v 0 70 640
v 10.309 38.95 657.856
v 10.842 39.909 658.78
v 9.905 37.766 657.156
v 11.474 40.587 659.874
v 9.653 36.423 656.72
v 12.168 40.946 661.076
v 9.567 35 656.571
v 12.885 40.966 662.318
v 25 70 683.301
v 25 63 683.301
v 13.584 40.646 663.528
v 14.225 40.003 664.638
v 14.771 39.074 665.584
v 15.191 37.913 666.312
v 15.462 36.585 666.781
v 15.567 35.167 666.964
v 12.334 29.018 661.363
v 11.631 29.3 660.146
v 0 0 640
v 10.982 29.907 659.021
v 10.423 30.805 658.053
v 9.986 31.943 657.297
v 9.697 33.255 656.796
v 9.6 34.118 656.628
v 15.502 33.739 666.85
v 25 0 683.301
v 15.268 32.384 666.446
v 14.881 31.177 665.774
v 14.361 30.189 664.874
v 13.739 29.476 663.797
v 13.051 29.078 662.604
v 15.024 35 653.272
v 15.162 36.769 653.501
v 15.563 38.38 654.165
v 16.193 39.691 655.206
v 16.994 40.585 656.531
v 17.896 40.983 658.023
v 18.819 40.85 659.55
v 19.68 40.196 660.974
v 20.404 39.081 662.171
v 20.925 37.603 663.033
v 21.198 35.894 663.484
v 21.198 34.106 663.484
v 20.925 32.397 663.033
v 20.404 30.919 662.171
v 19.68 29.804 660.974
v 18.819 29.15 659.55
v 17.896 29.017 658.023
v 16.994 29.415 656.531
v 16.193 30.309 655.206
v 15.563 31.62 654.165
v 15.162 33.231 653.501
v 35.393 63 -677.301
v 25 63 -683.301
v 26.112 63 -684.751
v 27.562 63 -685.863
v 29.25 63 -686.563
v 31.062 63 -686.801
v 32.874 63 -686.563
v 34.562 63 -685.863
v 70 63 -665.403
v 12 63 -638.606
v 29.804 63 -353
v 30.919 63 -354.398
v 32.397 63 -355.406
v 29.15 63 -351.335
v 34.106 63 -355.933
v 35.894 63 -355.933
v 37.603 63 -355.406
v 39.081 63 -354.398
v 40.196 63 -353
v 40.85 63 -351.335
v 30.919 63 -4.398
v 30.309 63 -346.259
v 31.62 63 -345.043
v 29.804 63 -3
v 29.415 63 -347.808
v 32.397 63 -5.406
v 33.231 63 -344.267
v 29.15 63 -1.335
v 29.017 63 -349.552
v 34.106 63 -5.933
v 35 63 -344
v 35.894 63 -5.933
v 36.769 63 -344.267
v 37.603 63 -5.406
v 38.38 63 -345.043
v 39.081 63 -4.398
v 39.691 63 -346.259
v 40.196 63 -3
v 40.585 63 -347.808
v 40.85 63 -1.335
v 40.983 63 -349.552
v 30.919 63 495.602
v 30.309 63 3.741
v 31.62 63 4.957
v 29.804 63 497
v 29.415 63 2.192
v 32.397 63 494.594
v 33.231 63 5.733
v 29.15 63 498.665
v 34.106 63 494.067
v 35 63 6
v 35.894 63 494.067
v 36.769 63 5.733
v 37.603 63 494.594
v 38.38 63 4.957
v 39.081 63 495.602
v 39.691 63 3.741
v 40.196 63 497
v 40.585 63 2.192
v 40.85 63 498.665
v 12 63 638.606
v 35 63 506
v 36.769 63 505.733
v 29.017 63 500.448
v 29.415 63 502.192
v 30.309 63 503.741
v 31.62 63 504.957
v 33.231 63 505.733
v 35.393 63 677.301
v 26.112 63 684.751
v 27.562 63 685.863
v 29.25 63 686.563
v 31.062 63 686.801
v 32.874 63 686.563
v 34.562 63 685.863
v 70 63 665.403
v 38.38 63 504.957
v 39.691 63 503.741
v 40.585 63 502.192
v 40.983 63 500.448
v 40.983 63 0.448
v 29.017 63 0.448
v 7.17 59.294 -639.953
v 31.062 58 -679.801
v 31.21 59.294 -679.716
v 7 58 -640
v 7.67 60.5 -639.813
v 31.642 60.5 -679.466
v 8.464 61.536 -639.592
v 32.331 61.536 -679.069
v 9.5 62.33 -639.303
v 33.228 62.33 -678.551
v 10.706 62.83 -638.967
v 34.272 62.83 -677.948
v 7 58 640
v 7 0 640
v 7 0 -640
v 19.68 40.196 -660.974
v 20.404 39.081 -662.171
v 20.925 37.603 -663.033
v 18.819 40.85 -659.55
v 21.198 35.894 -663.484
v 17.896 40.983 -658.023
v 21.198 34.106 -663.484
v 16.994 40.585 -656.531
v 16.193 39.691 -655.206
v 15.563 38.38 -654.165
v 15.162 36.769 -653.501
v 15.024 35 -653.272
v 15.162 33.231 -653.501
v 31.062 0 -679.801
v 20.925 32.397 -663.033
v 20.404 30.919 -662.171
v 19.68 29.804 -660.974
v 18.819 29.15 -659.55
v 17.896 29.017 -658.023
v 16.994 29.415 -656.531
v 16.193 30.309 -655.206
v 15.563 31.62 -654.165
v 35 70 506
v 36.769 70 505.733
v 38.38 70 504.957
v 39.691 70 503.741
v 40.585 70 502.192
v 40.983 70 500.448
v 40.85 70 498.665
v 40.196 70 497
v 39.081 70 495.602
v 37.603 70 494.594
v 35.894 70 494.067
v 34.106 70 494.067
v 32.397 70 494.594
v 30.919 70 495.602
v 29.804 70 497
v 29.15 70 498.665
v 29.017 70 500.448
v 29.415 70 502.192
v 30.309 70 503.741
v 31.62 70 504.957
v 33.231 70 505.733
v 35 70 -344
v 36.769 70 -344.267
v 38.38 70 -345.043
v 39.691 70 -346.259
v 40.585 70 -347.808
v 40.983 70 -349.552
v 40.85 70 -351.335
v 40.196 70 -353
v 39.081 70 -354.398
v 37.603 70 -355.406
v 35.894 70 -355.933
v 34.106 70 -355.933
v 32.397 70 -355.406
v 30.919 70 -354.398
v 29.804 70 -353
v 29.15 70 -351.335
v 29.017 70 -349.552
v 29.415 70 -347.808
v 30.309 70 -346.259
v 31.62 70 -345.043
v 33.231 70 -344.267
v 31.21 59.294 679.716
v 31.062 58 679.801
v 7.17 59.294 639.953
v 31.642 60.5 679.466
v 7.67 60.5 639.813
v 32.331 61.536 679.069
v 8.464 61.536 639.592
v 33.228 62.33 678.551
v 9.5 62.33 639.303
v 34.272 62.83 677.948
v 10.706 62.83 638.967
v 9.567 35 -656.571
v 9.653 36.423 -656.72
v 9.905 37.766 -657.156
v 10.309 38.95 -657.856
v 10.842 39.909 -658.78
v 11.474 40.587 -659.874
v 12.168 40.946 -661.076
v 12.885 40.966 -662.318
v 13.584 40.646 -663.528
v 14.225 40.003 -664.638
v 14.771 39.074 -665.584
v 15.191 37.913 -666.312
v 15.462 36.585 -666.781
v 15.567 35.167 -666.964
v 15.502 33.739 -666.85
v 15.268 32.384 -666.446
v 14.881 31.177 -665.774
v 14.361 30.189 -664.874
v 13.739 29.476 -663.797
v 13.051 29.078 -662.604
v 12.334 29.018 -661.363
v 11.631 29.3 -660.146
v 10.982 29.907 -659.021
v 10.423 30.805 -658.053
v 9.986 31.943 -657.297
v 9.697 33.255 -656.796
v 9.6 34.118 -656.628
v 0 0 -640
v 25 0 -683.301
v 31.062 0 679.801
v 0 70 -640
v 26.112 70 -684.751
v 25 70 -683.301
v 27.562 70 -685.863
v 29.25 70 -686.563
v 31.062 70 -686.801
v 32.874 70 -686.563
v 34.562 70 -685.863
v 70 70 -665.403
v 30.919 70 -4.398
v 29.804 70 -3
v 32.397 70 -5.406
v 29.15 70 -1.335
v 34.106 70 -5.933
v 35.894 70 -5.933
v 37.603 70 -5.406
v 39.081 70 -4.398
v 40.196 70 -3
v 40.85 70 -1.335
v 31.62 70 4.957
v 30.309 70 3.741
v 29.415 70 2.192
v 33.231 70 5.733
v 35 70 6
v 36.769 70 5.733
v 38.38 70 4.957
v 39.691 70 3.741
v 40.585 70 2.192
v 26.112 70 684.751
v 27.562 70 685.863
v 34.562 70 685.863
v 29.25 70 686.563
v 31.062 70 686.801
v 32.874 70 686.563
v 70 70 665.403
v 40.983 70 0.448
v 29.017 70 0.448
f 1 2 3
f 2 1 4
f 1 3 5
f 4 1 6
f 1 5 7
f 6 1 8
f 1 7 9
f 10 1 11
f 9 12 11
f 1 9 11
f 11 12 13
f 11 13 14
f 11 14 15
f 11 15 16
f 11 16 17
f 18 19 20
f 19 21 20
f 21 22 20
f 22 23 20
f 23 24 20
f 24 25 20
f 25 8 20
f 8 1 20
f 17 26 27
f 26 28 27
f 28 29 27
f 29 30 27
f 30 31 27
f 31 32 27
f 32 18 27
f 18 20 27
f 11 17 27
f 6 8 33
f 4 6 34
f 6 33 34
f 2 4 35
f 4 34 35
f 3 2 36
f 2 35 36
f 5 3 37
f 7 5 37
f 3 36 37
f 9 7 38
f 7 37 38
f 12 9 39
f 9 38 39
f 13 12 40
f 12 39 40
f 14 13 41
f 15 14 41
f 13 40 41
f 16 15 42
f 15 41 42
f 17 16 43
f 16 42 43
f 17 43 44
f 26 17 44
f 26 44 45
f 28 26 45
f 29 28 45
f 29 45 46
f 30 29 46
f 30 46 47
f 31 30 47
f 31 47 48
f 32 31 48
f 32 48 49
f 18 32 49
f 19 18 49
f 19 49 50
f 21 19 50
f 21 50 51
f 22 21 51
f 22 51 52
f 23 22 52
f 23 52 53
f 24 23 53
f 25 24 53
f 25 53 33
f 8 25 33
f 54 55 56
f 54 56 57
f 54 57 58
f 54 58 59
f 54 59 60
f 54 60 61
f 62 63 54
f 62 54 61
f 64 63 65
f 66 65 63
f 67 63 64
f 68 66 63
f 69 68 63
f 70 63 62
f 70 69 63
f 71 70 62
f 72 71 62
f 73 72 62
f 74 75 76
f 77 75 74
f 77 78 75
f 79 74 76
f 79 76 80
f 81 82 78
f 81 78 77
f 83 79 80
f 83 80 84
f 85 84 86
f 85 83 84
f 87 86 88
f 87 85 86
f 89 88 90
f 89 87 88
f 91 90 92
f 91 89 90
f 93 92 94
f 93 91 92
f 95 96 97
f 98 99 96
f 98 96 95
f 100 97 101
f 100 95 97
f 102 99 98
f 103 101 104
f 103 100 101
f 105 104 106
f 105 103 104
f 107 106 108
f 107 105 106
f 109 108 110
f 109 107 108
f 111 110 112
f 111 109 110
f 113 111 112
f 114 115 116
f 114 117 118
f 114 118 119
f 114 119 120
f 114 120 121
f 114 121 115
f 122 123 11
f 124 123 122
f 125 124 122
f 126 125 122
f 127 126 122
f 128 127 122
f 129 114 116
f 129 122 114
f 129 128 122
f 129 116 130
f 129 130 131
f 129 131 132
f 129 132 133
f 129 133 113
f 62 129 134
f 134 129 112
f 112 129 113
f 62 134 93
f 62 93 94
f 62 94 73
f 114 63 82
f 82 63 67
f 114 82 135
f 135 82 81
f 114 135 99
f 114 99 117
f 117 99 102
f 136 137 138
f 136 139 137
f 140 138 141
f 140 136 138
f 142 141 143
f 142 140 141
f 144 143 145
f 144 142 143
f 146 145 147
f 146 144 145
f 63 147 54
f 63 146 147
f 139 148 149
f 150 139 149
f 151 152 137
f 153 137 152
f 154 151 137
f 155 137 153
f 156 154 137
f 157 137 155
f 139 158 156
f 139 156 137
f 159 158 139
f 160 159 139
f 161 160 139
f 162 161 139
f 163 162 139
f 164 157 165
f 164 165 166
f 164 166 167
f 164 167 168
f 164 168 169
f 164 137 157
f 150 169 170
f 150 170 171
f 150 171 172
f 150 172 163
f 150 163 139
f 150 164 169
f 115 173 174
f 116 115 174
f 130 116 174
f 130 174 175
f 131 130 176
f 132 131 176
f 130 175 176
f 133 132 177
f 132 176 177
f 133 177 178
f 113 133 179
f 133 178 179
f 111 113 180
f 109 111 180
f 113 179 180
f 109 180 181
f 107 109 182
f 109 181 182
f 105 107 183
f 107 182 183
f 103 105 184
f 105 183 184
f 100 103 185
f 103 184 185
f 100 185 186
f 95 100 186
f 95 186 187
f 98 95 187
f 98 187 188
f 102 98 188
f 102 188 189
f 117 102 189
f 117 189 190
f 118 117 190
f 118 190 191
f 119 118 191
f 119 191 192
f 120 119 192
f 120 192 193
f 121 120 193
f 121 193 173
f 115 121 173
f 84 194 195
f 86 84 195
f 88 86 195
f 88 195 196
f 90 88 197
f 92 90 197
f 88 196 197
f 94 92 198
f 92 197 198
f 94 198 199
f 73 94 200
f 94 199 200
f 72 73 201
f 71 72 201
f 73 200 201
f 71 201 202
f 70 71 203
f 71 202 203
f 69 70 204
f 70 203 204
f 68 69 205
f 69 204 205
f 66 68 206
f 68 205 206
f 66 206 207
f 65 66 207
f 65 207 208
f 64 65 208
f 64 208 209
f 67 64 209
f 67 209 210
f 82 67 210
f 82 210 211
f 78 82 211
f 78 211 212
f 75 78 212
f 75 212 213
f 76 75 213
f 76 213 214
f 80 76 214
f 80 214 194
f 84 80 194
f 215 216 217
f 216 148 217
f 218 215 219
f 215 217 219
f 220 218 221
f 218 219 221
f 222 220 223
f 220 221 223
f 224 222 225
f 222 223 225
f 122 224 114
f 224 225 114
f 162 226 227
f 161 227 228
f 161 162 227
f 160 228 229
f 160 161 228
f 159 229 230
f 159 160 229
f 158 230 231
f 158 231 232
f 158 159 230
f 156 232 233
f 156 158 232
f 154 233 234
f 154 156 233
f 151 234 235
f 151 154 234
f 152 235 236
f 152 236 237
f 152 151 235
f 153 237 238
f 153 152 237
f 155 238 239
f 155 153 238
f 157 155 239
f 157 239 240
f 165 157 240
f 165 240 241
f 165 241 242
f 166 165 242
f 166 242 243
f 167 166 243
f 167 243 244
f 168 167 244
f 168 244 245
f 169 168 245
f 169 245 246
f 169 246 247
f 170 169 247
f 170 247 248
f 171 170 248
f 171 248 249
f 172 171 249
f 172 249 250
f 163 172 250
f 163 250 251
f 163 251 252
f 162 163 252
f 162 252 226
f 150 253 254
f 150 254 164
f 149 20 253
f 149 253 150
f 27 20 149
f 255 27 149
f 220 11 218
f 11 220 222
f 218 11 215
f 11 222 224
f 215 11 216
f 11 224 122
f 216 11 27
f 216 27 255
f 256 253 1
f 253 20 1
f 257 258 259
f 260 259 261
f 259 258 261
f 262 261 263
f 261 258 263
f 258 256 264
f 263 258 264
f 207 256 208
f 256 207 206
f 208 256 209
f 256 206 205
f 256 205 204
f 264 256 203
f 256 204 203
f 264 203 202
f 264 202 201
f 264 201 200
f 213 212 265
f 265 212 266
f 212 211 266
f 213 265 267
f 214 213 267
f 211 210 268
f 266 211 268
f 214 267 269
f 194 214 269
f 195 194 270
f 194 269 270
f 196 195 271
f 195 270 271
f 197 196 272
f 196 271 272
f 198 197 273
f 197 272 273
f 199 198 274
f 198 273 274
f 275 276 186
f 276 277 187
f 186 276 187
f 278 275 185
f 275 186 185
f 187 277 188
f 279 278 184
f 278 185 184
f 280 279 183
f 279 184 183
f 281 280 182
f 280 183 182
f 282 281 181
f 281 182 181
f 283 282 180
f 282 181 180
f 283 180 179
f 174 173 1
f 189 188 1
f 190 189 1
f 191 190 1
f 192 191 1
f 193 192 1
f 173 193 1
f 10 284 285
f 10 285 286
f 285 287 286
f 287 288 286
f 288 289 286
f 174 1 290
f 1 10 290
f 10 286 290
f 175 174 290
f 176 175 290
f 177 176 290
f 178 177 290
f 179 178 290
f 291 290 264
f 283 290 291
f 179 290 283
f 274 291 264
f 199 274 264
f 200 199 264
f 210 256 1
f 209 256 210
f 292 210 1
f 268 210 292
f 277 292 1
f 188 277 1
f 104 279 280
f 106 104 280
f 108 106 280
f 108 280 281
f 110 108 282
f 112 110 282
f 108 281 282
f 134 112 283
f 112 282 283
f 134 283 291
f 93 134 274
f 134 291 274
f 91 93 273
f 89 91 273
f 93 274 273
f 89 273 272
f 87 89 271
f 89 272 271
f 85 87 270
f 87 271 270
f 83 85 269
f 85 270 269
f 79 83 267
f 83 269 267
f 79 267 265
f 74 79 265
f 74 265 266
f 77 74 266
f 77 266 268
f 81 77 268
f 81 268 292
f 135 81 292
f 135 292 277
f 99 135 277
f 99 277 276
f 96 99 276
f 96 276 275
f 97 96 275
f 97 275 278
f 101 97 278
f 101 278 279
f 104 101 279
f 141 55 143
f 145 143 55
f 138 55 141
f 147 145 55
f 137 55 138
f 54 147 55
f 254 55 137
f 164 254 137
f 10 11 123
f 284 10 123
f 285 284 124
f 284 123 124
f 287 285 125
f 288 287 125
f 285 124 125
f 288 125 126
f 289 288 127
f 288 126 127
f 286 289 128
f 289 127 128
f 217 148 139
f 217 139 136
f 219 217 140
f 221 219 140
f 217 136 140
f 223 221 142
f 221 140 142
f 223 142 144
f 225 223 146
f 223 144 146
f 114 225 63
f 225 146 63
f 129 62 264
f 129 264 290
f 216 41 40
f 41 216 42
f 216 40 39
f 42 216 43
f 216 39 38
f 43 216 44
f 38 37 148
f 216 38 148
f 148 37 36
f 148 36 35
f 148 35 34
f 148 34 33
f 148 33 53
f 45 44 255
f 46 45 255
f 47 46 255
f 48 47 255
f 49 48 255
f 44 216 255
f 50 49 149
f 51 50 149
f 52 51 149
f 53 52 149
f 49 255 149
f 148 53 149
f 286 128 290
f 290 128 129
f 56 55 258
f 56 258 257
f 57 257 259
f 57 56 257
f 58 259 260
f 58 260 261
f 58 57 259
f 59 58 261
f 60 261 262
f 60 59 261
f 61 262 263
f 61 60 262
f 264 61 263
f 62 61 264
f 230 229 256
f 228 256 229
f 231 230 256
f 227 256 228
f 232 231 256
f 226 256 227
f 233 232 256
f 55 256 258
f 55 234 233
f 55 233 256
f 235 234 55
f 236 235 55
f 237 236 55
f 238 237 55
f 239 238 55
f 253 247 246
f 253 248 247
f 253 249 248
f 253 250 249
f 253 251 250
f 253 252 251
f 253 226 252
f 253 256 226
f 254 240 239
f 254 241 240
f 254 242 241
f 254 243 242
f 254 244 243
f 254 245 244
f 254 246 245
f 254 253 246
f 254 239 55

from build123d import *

# Parameters (mm, degrees)
BOSS_EXTRUDE1_DEPTH = 640
BOSS_EXTRUDE2_DEPTH = 63
BOSS_EXTRUDE4_DEPTH = 7
SKETCH10_R          = 6
CUT_EXTRUDE3_DEPTH  = 7
FILLET5_R           = 5
SKETCH22_R          = 6
CUT_EXTRUDE4_DEPTH  = 335


with BuildPart() as part:
    # Sketch1 → Boss-Extrude1 (new body)
    with BuildSketch(Plane.XY):
        Polygon((0, 0), (0, 70), (70, 70), (70, 63), (7, 63), (7, 0), align=None)
    extrude(amount=BOSS_EXTRUDE1_DEPTH)

    # Sketch2 → Boss-Extrude2 (add)
    with BuildSketch(Plane(origin=(0, 0, 0), x_dir=(1, 0, 0), z_dir=(0, 1, 0))):
        Polygon((0, -640), (25, -683.301270189), (31.062177826, -679.801270189), (7, -640), align=None)
    extrude(amount=BOSS_EXTRUDE2_DEPTH)

    # Sketch9 → Boss-Extrude4 (add)
    with BuildSketch(Plane(origin=(0, 63, 0), x_dir=(1, 0, 0), z_dir=(0, 1, 0))):
        with BuildLine():
            Line((0, -640), (25, -683.301270189))
            ThreePointArc((25, -683.301270189), (29.250444511, -686.562750973), (34.562177826, -685.863448016))
            Line((34.562177826, -685.863448016), (70, -665.403411844))
            Line((70, -665.403411844), (70, -640))
            Line((70, -640), (0, -640))
        make_face()
    extrude(amount=BOSS_EXTRUDE4_DEPTH)

    # Sketch10 → Cut-Extrude3 (cut)
    with BuildSketch(Plane(origin=(-278.227615862, 0, 168.20474164), x_dir=(-0.5173609804017633, 0, -0.8557672674026079), z_dir=(0.8557672674026079, 0, -0.5173609804017633))):
        with Locations((-572.82203414, 35)):
            Circle(SKETCH10_R)
    extrude(amount=-CUT_EXTRUDE3_DEPTH, mode=Mode.SUBTRACT)

    # Fillet5
    fillet5_edges = [part.edges().sort_by_distance(p)[0] for p in [
        (7, 63, 320),
        (19.031088913, 63, 659.900635095),
    ]]
    fillet(fillet5_edges, radius=FILLET5_R)

    # Mirror6: part across plane


with BuildPart() as part_1:
    add(part.part)
    add(part.part.mirror(Plane.XY))

    # Sketch22 → Cut-Extrude4 (cut)
    with BuildSketch(Plane(origin=(0, 70, 0), x_dir=(1, 0, 0), z_dir=(0, 1, 0))):
        with Locations(Location((35, 0, 0), (0, 0, 270))):
            Circle(SKETCH22_R)
        with Locations(Location((35, 350, 0), (0, 0, 270))):
            Circle(SKETCH22_R)
        with Locations(Location((35, -500, 0), (0, 0, 270))):
            Circle(SKETCH22_R)
    extrude(amount=-CUT_EXTRUDE4_DEPTH, mode=Mode.SUBTRACT)


solid = part_1.part
